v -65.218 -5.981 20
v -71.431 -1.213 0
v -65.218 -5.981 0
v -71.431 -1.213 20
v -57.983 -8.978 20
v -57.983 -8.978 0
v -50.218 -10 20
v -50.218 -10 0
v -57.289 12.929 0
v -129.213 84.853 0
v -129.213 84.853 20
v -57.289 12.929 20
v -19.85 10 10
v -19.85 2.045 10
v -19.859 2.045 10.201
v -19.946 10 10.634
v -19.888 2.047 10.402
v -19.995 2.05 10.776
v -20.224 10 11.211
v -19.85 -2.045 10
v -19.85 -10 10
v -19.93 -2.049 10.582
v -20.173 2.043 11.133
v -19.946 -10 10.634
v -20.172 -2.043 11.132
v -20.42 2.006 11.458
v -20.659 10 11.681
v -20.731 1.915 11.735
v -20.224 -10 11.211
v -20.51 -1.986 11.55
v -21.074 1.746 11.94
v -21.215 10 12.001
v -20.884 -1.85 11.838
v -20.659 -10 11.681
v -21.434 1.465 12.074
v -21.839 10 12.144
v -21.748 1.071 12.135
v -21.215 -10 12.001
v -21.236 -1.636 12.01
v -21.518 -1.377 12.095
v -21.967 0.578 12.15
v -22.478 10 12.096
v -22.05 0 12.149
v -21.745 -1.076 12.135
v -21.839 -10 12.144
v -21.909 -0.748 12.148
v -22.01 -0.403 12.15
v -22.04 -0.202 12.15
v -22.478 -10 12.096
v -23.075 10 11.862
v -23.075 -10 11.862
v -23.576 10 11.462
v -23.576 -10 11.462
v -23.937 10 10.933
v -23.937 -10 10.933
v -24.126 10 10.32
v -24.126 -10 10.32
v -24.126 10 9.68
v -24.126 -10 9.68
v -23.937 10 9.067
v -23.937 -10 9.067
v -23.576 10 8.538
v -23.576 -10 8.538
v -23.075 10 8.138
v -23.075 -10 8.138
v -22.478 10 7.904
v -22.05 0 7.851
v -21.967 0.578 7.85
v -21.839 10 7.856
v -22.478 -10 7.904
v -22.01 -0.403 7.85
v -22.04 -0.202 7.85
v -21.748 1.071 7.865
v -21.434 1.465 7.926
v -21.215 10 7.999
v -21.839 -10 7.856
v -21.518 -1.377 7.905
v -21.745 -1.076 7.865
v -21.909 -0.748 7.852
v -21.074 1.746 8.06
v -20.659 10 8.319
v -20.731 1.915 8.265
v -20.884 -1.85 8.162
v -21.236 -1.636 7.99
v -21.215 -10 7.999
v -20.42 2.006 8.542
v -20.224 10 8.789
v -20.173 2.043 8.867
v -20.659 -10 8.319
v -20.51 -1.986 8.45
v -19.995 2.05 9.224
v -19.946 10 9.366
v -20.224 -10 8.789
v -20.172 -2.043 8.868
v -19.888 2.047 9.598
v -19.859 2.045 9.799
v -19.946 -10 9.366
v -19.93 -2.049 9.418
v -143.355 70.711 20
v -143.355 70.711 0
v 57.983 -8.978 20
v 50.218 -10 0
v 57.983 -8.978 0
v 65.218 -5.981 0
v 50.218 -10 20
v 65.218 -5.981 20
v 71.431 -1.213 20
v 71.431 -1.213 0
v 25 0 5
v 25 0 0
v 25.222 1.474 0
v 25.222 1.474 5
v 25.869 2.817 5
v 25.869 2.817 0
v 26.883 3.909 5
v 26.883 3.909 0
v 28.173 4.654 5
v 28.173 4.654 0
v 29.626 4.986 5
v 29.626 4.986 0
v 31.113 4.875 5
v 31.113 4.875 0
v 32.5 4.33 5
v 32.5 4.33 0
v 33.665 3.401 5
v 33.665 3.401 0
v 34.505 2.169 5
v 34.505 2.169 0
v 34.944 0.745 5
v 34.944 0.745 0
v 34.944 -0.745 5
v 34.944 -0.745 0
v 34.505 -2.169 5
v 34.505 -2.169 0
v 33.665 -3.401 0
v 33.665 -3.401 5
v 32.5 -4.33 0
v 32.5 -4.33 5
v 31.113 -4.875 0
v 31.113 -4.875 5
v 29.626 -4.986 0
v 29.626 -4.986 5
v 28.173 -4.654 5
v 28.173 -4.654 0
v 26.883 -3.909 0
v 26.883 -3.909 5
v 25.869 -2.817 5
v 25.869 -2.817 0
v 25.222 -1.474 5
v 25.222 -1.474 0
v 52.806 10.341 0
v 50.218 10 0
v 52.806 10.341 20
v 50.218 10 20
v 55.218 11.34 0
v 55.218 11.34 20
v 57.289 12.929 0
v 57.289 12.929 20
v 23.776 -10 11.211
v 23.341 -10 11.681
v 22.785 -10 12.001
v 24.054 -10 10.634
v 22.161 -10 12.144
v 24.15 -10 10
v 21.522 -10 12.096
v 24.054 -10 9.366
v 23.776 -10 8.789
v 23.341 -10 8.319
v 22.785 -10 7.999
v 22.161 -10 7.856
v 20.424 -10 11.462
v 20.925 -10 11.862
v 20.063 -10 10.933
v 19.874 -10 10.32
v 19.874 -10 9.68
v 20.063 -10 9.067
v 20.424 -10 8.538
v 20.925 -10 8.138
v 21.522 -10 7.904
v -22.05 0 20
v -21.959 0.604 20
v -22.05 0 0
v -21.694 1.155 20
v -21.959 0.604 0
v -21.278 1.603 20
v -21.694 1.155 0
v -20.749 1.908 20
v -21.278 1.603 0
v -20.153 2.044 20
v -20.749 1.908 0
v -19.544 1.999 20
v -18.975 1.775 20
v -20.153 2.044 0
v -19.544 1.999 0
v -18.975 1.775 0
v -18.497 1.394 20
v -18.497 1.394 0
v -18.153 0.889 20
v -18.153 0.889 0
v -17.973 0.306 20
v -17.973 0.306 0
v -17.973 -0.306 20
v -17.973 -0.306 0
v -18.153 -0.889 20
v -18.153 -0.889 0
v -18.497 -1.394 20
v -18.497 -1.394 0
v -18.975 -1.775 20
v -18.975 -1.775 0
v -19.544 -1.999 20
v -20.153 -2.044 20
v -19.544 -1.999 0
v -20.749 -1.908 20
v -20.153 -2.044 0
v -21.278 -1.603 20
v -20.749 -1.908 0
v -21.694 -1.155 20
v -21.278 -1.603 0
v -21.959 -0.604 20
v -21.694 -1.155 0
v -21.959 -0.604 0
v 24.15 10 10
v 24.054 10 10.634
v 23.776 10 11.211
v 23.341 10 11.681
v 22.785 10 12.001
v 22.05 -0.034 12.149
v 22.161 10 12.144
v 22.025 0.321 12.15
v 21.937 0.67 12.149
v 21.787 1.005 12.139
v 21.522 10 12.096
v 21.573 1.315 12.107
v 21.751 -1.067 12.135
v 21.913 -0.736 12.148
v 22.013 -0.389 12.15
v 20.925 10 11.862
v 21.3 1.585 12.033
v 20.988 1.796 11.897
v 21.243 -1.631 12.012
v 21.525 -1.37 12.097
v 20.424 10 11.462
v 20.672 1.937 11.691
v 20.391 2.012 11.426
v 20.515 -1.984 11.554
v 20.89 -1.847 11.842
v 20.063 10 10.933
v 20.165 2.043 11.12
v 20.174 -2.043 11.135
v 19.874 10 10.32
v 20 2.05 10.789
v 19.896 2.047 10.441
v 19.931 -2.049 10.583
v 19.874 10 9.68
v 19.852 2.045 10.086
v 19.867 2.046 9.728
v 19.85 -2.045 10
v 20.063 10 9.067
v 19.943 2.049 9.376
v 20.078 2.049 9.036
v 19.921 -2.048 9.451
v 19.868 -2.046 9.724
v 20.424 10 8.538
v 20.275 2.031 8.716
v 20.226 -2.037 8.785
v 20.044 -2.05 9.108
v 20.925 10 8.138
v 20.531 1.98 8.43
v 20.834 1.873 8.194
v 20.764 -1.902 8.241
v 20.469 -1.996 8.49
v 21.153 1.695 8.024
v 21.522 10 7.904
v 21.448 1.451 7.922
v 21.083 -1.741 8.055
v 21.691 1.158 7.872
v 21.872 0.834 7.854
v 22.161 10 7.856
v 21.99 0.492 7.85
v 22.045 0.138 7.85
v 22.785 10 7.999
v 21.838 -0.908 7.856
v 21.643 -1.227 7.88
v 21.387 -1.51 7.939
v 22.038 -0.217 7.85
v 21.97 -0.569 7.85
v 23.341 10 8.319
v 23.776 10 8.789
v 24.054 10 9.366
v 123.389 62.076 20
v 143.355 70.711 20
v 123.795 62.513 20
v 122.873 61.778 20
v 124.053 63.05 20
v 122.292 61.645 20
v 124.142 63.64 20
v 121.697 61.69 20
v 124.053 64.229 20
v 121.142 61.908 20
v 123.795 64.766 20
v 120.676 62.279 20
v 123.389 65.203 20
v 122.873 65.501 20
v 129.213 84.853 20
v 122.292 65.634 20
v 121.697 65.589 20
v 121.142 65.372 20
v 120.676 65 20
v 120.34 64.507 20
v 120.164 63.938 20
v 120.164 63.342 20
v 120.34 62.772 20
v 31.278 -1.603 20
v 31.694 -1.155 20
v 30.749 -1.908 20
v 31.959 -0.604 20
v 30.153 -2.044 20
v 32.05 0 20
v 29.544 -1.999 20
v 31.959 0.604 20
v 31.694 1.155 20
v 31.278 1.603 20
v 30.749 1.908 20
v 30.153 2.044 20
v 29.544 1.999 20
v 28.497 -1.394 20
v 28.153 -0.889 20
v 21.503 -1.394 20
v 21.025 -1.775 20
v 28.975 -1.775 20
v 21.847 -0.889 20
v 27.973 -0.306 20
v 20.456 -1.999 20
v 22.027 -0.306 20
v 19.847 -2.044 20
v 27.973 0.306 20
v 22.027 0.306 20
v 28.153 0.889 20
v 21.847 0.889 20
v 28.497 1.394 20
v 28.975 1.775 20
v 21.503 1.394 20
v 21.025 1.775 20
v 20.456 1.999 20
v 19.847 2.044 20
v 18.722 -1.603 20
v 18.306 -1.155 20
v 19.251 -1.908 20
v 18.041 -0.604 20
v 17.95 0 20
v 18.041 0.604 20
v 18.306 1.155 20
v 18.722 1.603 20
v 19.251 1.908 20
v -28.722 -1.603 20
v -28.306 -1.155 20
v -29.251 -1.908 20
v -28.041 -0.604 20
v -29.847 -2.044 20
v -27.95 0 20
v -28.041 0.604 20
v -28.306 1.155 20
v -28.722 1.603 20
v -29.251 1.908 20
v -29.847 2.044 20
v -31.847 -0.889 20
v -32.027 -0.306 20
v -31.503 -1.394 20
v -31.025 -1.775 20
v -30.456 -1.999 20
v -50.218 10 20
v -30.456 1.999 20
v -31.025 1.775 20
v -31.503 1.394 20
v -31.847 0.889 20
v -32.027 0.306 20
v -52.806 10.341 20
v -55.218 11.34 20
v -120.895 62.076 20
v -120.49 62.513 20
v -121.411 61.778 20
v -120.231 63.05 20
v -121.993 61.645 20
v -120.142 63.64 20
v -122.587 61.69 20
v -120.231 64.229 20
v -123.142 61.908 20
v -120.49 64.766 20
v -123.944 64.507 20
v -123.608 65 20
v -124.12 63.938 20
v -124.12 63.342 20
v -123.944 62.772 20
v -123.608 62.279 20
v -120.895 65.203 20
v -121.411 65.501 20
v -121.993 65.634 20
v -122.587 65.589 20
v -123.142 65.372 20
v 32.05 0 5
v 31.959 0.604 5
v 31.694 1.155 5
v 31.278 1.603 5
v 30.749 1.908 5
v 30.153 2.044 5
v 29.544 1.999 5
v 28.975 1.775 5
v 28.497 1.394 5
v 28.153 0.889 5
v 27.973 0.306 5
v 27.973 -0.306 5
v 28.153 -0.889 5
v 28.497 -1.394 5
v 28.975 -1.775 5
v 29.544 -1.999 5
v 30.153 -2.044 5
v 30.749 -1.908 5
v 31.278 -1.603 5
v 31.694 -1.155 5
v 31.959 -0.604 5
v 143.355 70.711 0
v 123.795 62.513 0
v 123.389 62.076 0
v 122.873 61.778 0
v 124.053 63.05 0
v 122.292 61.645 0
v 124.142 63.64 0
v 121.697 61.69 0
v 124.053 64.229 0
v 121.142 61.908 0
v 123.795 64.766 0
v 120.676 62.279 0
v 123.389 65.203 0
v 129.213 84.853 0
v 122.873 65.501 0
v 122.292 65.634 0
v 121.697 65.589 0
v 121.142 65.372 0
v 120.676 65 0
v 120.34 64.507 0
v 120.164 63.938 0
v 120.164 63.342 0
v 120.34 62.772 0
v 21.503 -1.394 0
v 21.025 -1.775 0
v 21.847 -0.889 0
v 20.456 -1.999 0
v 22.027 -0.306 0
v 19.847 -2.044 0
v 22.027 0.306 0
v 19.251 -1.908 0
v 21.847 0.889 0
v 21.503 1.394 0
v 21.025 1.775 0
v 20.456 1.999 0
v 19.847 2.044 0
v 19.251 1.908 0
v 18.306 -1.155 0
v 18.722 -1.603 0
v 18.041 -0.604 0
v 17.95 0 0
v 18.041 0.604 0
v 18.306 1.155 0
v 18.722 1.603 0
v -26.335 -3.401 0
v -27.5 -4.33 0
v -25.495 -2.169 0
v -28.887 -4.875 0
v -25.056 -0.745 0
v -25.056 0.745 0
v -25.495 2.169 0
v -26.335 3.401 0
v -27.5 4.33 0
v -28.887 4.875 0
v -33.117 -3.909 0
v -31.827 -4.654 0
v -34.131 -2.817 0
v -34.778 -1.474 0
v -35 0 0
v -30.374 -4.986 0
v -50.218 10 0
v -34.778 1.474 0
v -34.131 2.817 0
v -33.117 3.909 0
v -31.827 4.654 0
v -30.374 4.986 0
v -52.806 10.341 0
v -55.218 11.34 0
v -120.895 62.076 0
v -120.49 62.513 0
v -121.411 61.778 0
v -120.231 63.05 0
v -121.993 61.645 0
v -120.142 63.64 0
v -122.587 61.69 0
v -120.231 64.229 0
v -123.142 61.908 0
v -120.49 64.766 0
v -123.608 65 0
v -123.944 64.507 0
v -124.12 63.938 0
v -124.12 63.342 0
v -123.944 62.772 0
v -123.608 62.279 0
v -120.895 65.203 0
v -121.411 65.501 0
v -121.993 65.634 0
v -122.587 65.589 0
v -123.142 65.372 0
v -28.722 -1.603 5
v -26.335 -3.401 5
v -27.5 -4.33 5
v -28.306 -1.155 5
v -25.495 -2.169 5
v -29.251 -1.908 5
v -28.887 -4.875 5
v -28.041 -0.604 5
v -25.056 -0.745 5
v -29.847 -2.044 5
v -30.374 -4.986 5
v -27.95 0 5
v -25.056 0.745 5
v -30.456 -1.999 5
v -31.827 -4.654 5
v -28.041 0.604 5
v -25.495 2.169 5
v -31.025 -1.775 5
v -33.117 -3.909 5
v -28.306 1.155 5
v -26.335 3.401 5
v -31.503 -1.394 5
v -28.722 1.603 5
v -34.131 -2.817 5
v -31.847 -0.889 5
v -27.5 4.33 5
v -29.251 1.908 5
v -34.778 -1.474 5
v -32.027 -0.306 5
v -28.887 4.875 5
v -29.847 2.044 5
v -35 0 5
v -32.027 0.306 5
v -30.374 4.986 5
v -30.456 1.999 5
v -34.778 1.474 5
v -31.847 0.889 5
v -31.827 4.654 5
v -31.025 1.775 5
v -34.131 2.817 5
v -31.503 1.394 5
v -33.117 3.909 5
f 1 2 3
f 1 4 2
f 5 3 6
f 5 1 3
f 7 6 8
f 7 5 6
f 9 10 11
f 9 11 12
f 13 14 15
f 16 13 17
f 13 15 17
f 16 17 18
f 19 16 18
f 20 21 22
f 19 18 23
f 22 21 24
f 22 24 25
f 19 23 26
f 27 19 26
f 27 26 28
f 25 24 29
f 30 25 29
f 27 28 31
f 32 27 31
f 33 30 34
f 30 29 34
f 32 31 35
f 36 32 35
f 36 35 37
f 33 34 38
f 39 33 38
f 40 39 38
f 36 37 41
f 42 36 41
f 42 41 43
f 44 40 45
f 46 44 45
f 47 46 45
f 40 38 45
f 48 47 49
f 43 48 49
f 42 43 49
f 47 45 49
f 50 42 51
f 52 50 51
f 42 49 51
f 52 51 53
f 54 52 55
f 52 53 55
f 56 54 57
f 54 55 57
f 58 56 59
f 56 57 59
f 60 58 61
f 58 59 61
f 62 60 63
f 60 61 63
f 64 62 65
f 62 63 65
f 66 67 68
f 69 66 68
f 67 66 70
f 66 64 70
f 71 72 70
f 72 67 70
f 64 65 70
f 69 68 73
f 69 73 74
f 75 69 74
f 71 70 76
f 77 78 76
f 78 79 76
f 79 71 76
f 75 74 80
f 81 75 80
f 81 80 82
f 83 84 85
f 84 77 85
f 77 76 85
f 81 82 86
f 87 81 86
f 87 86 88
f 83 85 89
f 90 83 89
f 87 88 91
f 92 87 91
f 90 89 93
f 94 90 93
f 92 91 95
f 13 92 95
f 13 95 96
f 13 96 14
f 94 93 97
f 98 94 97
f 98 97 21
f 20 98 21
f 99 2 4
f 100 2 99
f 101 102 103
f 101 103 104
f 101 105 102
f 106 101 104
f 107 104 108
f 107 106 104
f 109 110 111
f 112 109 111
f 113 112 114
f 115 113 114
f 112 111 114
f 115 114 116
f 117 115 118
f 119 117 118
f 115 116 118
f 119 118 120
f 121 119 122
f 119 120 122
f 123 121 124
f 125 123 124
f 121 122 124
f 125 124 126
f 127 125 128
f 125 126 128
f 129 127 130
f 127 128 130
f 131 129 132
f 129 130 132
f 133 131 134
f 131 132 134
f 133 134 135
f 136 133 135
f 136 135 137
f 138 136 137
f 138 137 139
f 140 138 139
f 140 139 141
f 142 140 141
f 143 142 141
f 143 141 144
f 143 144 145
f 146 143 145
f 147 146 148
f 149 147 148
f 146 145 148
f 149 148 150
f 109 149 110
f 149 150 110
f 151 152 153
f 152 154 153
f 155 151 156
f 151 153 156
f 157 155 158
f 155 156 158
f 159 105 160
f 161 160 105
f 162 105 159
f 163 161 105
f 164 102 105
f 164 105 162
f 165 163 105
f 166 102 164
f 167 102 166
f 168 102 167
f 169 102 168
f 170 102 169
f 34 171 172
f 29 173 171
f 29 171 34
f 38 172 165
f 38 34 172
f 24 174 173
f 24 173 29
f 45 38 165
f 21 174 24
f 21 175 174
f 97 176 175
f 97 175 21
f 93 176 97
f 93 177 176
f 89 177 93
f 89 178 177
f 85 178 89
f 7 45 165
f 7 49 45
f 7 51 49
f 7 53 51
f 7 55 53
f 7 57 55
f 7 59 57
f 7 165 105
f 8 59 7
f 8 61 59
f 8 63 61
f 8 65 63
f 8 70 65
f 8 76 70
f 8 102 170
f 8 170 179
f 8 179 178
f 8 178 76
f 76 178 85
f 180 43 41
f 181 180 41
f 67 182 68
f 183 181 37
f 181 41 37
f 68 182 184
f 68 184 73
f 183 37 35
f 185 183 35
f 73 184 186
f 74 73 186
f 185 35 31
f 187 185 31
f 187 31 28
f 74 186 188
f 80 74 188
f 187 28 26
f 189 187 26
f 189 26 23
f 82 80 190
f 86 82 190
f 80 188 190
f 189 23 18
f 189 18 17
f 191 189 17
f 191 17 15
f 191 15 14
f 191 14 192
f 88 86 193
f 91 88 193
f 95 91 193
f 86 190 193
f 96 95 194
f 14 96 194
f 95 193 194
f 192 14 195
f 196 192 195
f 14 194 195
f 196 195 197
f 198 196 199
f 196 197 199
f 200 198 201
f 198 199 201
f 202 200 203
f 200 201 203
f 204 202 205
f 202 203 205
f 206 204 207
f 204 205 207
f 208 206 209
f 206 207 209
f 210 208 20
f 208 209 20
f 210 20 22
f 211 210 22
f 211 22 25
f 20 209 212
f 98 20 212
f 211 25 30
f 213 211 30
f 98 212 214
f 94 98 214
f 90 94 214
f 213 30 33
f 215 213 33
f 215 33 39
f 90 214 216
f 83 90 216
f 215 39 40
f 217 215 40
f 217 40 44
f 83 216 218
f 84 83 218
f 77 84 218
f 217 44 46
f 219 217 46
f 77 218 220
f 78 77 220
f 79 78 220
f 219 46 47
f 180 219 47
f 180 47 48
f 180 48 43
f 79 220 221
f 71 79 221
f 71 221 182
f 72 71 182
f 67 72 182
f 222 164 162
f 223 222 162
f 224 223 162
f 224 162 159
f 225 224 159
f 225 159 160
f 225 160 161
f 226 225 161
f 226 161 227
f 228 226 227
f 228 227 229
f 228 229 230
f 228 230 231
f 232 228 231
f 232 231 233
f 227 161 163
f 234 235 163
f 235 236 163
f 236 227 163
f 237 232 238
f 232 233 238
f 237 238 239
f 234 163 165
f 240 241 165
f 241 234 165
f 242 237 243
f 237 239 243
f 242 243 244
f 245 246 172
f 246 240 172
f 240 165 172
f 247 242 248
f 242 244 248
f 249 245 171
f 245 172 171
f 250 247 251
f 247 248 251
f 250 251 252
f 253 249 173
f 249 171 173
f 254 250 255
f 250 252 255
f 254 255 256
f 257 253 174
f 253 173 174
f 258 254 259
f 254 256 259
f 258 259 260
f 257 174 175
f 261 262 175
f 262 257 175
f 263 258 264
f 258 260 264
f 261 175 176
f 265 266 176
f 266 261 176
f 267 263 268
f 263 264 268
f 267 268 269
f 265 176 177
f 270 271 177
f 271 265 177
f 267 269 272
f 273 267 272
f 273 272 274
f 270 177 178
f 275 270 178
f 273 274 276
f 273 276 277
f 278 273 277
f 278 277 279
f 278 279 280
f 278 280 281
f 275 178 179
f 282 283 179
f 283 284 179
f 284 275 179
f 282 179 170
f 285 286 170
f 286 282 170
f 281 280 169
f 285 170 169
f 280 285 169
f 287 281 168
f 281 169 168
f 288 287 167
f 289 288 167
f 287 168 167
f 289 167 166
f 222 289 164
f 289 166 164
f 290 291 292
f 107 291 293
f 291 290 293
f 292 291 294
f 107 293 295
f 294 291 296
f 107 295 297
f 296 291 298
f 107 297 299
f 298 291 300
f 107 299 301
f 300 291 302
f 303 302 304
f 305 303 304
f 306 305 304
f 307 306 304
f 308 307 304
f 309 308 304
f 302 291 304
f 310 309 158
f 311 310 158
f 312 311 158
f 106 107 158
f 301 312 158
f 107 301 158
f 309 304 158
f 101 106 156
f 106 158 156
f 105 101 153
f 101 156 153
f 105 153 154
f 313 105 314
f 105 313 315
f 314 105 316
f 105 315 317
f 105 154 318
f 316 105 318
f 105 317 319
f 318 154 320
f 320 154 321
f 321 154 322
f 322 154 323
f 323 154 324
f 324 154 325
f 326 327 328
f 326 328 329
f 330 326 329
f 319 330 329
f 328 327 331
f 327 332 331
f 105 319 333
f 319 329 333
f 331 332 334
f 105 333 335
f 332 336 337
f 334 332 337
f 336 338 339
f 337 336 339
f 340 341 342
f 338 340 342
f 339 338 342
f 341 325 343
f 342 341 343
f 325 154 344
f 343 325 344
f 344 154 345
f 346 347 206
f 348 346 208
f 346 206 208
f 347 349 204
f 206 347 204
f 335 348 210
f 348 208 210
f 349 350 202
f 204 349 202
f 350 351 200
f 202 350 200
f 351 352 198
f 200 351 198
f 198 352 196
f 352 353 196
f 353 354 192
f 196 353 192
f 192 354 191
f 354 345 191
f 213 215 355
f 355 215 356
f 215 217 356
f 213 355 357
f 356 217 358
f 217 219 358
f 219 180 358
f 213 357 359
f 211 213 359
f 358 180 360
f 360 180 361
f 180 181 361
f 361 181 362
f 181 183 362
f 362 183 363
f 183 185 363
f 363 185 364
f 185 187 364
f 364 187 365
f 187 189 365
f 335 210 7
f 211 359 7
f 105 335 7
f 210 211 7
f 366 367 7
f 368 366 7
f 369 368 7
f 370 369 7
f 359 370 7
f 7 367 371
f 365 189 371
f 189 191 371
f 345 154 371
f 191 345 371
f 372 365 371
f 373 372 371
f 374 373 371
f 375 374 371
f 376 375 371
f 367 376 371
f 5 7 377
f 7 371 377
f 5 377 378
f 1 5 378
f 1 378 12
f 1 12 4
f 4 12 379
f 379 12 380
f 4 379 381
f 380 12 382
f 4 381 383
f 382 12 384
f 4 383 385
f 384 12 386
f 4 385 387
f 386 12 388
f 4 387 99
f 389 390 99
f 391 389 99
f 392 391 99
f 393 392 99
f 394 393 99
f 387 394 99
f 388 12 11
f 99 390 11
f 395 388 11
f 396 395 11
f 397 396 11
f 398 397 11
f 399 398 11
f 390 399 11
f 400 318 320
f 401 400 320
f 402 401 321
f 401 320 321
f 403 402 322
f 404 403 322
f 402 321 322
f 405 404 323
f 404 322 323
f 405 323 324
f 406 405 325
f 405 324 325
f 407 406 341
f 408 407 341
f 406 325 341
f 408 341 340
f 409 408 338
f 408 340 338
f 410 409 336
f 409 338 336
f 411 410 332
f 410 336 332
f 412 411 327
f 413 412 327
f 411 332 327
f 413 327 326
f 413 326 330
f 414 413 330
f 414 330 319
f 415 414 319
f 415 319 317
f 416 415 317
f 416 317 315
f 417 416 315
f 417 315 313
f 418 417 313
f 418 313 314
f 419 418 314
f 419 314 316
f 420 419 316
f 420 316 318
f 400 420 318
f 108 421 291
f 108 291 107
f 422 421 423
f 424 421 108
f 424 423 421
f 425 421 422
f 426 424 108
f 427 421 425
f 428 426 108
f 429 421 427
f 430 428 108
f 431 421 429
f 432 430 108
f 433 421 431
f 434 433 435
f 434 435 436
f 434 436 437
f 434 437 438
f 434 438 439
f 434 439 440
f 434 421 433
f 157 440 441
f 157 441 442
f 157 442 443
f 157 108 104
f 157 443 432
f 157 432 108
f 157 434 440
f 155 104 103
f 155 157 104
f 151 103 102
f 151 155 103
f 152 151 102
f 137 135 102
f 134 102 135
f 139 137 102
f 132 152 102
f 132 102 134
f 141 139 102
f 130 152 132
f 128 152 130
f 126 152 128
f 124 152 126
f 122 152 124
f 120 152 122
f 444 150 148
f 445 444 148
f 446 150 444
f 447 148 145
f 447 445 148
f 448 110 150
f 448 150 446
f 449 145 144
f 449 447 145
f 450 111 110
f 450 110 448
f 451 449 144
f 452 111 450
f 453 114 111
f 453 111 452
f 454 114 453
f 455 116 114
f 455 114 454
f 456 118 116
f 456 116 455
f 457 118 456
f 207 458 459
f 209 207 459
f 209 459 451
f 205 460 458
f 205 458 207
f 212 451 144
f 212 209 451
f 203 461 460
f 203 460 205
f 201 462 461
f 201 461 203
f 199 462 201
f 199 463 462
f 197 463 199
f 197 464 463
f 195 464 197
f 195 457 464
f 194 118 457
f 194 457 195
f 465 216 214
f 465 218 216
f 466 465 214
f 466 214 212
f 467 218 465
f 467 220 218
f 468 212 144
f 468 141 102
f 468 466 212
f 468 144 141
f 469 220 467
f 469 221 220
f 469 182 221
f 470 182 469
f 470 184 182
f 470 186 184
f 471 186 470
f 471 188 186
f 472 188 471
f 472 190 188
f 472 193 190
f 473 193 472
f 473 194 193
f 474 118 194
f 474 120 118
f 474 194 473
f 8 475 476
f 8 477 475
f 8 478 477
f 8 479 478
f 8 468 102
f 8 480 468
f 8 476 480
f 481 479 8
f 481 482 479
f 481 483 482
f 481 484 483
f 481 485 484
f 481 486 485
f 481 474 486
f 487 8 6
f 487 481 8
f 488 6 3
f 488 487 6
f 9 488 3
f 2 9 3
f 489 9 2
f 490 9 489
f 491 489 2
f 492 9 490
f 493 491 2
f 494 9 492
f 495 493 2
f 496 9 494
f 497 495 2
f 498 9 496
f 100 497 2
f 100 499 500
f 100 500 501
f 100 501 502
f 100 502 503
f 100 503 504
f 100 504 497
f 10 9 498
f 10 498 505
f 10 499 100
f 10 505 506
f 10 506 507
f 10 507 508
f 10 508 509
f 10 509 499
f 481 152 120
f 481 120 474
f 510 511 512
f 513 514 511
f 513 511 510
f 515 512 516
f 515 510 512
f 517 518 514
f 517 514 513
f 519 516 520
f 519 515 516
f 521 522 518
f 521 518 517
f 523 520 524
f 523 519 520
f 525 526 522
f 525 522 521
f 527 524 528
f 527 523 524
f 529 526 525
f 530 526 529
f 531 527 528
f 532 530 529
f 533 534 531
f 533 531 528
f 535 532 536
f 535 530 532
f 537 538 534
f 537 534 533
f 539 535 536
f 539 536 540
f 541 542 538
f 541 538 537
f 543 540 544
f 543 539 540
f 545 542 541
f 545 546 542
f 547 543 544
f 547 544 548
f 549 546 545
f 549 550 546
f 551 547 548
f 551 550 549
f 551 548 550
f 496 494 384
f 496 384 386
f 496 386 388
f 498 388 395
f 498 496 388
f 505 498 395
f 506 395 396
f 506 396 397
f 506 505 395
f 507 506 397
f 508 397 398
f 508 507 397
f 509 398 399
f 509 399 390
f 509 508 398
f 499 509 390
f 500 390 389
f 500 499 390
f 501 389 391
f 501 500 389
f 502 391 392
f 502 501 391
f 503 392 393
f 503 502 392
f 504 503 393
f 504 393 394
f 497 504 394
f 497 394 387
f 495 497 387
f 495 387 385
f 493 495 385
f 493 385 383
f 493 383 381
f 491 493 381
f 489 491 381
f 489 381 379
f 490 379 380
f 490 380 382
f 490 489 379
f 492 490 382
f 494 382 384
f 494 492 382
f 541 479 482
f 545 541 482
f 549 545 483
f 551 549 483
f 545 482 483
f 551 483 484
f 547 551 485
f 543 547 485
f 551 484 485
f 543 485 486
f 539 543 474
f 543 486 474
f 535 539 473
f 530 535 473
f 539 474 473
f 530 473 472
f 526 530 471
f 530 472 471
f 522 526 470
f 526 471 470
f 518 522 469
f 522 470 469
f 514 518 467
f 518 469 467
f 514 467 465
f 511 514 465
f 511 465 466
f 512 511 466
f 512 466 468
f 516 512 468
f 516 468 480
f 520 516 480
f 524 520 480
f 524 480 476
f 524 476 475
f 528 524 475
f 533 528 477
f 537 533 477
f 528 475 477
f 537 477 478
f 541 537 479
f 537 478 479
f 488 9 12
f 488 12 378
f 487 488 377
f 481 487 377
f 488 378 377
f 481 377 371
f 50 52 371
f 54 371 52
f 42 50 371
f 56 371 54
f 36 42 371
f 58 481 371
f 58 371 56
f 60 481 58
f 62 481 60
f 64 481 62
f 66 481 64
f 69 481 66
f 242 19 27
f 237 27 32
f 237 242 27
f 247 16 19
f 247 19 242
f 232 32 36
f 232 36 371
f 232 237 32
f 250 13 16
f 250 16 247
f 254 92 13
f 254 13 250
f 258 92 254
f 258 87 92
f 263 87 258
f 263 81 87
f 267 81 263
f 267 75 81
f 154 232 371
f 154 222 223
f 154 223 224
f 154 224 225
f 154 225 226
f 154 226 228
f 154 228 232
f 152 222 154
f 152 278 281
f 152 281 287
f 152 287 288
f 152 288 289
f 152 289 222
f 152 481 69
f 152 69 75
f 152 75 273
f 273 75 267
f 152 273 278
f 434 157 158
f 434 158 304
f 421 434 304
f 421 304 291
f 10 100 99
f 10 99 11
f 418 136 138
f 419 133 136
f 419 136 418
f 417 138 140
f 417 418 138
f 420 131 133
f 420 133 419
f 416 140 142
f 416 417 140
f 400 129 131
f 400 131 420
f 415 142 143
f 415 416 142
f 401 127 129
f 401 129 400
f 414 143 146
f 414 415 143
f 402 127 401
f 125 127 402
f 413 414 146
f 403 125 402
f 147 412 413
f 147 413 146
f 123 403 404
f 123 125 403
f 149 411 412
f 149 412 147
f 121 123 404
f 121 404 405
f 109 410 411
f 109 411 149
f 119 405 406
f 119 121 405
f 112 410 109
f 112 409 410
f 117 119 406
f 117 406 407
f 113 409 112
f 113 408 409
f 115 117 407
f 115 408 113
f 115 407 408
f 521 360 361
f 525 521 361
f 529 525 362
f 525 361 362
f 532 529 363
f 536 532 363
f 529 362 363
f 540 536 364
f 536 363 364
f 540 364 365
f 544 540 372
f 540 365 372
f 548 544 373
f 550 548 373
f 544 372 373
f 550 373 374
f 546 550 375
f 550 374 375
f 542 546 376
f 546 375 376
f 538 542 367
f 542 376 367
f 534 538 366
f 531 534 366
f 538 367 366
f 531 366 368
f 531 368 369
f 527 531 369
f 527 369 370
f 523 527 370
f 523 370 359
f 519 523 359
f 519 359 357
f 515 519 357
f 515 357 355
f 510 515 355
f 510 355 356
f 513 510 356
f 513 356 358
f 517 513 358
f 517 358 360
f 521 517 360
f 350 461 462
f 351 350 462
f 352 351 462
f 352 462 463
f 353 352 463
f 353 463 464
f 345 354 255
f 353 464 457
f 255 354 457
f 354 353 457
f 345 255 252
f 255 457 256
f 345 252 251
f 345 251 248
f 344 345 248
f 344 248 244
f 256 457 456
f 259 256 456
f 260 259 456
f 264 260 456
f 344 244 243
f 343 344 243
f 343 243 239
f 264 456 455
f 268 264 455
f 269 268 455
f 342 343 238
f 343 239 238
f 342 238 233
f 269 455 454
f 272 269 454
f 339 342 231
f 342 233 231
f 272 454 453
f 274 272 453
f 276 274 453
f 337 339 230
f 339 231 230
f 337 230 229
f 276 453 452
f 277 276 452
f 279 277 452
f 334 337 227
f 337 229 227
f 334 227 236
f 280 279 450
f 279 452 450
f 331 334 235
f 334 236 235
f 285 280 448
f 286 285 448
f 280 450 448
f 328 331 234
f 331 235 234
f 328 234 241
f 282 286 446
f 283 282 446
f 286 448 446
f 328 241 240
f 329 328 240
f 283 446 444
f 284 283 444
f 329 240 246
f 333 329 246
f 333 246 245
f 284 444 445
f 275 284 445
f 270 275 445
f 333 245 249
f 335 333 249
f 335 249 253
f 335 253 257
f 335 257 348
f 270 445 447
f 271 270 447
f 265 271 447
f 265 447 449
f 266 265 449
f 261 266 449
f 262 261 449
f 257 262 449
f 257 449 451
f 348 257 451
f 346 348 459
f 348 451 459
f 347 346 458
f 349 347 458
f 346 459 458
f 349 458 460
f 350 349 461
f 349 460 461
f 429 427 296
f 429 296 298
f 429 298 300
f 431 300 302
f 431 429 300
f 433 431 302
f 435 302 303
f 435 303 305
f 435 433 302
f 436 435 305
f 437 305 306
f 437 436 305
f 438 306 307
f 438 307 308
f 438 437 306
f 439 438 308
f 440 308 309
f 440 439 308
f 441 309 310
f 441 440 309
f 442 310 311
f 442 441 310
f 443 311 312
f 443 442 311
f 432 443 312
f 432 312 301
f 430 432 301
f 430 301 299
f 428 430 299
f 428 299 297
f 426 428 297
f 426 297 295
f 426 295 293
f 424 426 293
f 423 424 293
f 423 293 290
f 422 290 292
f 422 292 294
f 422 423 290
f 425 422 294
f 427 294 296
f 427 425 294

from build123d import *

# Parameters (mm, degrees)
SKETCH_1_R          = 2
EXTRUDE_1_DEPTH     = 20
FILLET_1_R          = 10
FILLET_2_R          = 30
SKETCH_2_R          = 2.05
CUT_EXTRUDE_1_DEPTH = 50
SKETCH_3_R          = 5
CUT_EXTRUDE_2_DEPTH = 5
SKETCH_4_R          = 2.05
CUT_EXTRUDE_3_DEPTH = 29
SKETCH_5_R          = 2.15
CUT_EXTRUDE_4_DEPTH = 29


with BuildPart() as part:
    # 草图1 → 凸台-拉伸1 (new body)
    with BuildSketch(Plane.XY):
        Polygon((-143.355339059, 70.710678119), (-129.213203436, 84.852813742), (-54.360389693, 10), (54.360389693, 10), (129.213203436, 84.852813742), (143.355339059, 70.710678119), (62.644660941, -10), (-62.644660941, -10), align=None)
        with Locations((-122.142135624, 63.639610307)):
            Circle(SKETCH_1_R, mode=Mode.SUBTRACT)
        with Locations((122.142135624, 63.639610307)):
            Circle(SKETCH_1_R, mode=Mode.SUBTRACT)
    extrude(amount=EXTRUDE_1_DEPTH)

    # 圆角1
    fillet_1_edges = [part.edges().sort_by_distance(p)[0] for p in [
        (-54.360389693, 10, 10),
        (54.360389693, 10, 10),
    ]]
    fillet(fillet_1_edges, radius=FILLET_1_R)

    # 圆角2
    fillet_2_edges = [part.edges().sort_by_distance(p)[0] for p in [
        (62.644660941, -10, 10),
        (-62.644660941, -10, 10),
    ]]
    fillet(fillet_2_edges, radius=FILLET_2_R)

    # 草图2 → 切除-拉伸1 (cut)
    with BuildSketch(Plane.XY.offset(20)):
        with Locations((-30, 0)):
            Circle(SKETCH_2_R)
        with Locations((30, 0)):
            Circle(SKETCH_2_R)
    extrude(amount=-CUT_EXTRUDE_1_DEPTH, mode=Mode.SUBTRACT)

    # 草图3 → 切除-拉伸2 (cut)
    with BuildSketch(Plane(origin=(0, 0, 0), x_dir=(-1, 0, 0), z_dir=(0, 0, -1))):
        with Locations((-30, 0)):
            Circle(SKETCH_3_R)
        with Locations((30, 0)):
            Circle(SKETCH_3_R)
    extrude(amount=-CUT_EXTRUDE_2_DEPTH, mode=Mode.SUBTRACT)

    # 草图4 → 切除-拉伸3 (cut)
    with BuildSketch(Plane(origin=(0, 0, 0), x_dir=(-1, 0, 0), z_dir=(0, 0, -1))):
        with Locations((-20, 0)):
            Circle(SKETCH_4_R)
        with Locations((20, 0)):
            Circle(SKETCH_4_R)
    extrude(amount=-CUT_EXTRUDE_3_DEPTH, mode=Mode.SUBTRACT)

    # 草图5 → 切除-拉伸4 (cut)
    with BuildSketch(Plane.XZ.offset(10)):
        with Locations((-22, 10)):
            Circle(SKETCH_5_R)
        with Locations((22, 10)):
            Circle(SKETCH_5_R)
    extrude(amount=-CUT_EXTRUDE_4_DEPTH, mode=Mode.SUBTRACT)


solid = part.part
